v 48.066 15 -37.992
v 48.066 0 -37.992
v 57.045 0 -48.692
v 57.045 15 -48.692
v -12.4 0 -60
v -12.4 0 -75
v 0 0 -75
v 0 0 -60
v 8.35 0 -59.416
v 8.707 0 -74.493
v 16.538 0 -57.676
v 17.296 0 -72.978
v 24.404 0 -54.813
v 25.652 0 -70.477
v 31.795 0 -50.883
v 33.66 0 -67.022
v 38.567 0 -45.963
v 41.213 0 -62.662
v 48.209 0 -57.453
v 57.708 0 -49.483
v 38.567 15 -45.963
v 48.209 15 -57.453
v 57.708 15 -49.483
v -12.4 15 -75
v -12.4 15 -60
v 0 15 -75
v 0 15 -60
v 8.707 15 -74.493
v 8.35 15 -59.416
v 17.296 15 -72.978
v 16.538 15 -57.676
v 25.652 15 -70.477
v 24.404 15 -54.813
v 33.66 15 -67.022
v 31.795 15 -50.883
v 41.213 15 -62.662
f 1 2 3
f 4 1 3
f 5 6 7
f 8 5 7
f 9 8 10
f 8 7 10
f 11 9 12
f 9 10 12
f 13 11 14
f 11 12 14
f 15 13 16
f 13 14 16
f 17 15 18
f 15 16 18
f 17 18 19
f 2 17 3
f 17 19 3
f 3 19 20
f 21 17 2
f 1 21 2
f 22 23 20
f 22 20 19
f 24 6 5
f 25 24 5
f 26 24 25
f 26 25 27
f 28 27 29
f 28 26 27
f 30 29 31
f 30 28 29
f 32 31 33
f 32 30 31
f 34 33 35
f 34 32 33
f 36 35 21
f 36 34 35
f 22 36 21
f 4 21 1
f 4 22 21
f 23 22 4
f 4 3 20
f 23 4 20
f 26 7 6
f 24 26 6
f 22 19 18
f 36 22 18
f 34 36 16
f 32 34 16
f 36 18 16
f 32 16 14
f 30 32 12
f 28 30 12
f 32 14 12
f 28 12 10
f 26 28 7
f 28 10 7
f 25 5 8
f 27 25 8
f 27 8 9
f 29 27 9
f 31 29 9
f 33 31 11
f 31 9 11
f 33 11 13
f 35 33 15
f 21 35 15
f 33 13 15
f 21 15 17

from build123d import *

# Parameters (mm, degrees)
BOSS_EXTRUDE1_DEPTH = 15


with BuildPart() as part:
    # Sketch1 → Boss-Extrude1 (new body)
    with BuildSketch(Plane(origin=(0, 0, 0), x_dir=(1, 0, 0), z_dir=(0, 1, 0))):
        with BuildLine():
            Line((0, 75), (0, 60))
            ThreePointArc((0, 60), (20.5212086, 56.381557247), (38.567256581, 45.962666587))
            Line((38.567256581, 45.962666587), (48.209070726, 57.453333234))
            ThreePointArc((48.209070726, 57.453333234), (25.651510749, 70.476946559), (0, 75))
        make_face()
        with BuildLine():
            Line((48.209070726, 57.453333234), (38.567256581, 45.962666587))
            Line((38.567256581, 45.962666587), (48.066207676, 37.992100227))
            Line((48.066207676, 37.992100227), (57.044556278, 48.692079429))
            ThreePointArc((57.044556278, 48.692079429), (52.808819258, 53.256254173), (48.209070726, 57.453333234))
        make_face()
        with BuildLine():
            Line((57.708021821, 49.482766874), (48.209070726, 57.453333234))
            ThreePointArc((48.209070726, 57.453333234), (52.808819258, 53.256254173), (57.044556278, 48.692079429))
            Line((57.044556278, 48.692079429), (57.708021821, 49.482766874))
        make_face()
        with BuildLine():
            ThreePointArc((-12.4, 73.967830846), (-6.22144222, 74.741512272), (0, 75))
            Line((0, 75), (-12.4, 75))
            Line((-12.4, 75), (-12.4, 73.967830846))
        make_face()
        with BuildLine():
            Line((-12.4, 60), (0, 60))
            Line((0, 60), (0, 75))
            ThreePointArc((0, 75), (-6.22144222, 74.741512272), (-12.4, 73.967830846))
            Line((-12.4, 73.967830846), (-12.4, 60))
        make_face()
    extrude(amount=BOSS_EXTRUDE1_DEPTH)


solid = part.part
